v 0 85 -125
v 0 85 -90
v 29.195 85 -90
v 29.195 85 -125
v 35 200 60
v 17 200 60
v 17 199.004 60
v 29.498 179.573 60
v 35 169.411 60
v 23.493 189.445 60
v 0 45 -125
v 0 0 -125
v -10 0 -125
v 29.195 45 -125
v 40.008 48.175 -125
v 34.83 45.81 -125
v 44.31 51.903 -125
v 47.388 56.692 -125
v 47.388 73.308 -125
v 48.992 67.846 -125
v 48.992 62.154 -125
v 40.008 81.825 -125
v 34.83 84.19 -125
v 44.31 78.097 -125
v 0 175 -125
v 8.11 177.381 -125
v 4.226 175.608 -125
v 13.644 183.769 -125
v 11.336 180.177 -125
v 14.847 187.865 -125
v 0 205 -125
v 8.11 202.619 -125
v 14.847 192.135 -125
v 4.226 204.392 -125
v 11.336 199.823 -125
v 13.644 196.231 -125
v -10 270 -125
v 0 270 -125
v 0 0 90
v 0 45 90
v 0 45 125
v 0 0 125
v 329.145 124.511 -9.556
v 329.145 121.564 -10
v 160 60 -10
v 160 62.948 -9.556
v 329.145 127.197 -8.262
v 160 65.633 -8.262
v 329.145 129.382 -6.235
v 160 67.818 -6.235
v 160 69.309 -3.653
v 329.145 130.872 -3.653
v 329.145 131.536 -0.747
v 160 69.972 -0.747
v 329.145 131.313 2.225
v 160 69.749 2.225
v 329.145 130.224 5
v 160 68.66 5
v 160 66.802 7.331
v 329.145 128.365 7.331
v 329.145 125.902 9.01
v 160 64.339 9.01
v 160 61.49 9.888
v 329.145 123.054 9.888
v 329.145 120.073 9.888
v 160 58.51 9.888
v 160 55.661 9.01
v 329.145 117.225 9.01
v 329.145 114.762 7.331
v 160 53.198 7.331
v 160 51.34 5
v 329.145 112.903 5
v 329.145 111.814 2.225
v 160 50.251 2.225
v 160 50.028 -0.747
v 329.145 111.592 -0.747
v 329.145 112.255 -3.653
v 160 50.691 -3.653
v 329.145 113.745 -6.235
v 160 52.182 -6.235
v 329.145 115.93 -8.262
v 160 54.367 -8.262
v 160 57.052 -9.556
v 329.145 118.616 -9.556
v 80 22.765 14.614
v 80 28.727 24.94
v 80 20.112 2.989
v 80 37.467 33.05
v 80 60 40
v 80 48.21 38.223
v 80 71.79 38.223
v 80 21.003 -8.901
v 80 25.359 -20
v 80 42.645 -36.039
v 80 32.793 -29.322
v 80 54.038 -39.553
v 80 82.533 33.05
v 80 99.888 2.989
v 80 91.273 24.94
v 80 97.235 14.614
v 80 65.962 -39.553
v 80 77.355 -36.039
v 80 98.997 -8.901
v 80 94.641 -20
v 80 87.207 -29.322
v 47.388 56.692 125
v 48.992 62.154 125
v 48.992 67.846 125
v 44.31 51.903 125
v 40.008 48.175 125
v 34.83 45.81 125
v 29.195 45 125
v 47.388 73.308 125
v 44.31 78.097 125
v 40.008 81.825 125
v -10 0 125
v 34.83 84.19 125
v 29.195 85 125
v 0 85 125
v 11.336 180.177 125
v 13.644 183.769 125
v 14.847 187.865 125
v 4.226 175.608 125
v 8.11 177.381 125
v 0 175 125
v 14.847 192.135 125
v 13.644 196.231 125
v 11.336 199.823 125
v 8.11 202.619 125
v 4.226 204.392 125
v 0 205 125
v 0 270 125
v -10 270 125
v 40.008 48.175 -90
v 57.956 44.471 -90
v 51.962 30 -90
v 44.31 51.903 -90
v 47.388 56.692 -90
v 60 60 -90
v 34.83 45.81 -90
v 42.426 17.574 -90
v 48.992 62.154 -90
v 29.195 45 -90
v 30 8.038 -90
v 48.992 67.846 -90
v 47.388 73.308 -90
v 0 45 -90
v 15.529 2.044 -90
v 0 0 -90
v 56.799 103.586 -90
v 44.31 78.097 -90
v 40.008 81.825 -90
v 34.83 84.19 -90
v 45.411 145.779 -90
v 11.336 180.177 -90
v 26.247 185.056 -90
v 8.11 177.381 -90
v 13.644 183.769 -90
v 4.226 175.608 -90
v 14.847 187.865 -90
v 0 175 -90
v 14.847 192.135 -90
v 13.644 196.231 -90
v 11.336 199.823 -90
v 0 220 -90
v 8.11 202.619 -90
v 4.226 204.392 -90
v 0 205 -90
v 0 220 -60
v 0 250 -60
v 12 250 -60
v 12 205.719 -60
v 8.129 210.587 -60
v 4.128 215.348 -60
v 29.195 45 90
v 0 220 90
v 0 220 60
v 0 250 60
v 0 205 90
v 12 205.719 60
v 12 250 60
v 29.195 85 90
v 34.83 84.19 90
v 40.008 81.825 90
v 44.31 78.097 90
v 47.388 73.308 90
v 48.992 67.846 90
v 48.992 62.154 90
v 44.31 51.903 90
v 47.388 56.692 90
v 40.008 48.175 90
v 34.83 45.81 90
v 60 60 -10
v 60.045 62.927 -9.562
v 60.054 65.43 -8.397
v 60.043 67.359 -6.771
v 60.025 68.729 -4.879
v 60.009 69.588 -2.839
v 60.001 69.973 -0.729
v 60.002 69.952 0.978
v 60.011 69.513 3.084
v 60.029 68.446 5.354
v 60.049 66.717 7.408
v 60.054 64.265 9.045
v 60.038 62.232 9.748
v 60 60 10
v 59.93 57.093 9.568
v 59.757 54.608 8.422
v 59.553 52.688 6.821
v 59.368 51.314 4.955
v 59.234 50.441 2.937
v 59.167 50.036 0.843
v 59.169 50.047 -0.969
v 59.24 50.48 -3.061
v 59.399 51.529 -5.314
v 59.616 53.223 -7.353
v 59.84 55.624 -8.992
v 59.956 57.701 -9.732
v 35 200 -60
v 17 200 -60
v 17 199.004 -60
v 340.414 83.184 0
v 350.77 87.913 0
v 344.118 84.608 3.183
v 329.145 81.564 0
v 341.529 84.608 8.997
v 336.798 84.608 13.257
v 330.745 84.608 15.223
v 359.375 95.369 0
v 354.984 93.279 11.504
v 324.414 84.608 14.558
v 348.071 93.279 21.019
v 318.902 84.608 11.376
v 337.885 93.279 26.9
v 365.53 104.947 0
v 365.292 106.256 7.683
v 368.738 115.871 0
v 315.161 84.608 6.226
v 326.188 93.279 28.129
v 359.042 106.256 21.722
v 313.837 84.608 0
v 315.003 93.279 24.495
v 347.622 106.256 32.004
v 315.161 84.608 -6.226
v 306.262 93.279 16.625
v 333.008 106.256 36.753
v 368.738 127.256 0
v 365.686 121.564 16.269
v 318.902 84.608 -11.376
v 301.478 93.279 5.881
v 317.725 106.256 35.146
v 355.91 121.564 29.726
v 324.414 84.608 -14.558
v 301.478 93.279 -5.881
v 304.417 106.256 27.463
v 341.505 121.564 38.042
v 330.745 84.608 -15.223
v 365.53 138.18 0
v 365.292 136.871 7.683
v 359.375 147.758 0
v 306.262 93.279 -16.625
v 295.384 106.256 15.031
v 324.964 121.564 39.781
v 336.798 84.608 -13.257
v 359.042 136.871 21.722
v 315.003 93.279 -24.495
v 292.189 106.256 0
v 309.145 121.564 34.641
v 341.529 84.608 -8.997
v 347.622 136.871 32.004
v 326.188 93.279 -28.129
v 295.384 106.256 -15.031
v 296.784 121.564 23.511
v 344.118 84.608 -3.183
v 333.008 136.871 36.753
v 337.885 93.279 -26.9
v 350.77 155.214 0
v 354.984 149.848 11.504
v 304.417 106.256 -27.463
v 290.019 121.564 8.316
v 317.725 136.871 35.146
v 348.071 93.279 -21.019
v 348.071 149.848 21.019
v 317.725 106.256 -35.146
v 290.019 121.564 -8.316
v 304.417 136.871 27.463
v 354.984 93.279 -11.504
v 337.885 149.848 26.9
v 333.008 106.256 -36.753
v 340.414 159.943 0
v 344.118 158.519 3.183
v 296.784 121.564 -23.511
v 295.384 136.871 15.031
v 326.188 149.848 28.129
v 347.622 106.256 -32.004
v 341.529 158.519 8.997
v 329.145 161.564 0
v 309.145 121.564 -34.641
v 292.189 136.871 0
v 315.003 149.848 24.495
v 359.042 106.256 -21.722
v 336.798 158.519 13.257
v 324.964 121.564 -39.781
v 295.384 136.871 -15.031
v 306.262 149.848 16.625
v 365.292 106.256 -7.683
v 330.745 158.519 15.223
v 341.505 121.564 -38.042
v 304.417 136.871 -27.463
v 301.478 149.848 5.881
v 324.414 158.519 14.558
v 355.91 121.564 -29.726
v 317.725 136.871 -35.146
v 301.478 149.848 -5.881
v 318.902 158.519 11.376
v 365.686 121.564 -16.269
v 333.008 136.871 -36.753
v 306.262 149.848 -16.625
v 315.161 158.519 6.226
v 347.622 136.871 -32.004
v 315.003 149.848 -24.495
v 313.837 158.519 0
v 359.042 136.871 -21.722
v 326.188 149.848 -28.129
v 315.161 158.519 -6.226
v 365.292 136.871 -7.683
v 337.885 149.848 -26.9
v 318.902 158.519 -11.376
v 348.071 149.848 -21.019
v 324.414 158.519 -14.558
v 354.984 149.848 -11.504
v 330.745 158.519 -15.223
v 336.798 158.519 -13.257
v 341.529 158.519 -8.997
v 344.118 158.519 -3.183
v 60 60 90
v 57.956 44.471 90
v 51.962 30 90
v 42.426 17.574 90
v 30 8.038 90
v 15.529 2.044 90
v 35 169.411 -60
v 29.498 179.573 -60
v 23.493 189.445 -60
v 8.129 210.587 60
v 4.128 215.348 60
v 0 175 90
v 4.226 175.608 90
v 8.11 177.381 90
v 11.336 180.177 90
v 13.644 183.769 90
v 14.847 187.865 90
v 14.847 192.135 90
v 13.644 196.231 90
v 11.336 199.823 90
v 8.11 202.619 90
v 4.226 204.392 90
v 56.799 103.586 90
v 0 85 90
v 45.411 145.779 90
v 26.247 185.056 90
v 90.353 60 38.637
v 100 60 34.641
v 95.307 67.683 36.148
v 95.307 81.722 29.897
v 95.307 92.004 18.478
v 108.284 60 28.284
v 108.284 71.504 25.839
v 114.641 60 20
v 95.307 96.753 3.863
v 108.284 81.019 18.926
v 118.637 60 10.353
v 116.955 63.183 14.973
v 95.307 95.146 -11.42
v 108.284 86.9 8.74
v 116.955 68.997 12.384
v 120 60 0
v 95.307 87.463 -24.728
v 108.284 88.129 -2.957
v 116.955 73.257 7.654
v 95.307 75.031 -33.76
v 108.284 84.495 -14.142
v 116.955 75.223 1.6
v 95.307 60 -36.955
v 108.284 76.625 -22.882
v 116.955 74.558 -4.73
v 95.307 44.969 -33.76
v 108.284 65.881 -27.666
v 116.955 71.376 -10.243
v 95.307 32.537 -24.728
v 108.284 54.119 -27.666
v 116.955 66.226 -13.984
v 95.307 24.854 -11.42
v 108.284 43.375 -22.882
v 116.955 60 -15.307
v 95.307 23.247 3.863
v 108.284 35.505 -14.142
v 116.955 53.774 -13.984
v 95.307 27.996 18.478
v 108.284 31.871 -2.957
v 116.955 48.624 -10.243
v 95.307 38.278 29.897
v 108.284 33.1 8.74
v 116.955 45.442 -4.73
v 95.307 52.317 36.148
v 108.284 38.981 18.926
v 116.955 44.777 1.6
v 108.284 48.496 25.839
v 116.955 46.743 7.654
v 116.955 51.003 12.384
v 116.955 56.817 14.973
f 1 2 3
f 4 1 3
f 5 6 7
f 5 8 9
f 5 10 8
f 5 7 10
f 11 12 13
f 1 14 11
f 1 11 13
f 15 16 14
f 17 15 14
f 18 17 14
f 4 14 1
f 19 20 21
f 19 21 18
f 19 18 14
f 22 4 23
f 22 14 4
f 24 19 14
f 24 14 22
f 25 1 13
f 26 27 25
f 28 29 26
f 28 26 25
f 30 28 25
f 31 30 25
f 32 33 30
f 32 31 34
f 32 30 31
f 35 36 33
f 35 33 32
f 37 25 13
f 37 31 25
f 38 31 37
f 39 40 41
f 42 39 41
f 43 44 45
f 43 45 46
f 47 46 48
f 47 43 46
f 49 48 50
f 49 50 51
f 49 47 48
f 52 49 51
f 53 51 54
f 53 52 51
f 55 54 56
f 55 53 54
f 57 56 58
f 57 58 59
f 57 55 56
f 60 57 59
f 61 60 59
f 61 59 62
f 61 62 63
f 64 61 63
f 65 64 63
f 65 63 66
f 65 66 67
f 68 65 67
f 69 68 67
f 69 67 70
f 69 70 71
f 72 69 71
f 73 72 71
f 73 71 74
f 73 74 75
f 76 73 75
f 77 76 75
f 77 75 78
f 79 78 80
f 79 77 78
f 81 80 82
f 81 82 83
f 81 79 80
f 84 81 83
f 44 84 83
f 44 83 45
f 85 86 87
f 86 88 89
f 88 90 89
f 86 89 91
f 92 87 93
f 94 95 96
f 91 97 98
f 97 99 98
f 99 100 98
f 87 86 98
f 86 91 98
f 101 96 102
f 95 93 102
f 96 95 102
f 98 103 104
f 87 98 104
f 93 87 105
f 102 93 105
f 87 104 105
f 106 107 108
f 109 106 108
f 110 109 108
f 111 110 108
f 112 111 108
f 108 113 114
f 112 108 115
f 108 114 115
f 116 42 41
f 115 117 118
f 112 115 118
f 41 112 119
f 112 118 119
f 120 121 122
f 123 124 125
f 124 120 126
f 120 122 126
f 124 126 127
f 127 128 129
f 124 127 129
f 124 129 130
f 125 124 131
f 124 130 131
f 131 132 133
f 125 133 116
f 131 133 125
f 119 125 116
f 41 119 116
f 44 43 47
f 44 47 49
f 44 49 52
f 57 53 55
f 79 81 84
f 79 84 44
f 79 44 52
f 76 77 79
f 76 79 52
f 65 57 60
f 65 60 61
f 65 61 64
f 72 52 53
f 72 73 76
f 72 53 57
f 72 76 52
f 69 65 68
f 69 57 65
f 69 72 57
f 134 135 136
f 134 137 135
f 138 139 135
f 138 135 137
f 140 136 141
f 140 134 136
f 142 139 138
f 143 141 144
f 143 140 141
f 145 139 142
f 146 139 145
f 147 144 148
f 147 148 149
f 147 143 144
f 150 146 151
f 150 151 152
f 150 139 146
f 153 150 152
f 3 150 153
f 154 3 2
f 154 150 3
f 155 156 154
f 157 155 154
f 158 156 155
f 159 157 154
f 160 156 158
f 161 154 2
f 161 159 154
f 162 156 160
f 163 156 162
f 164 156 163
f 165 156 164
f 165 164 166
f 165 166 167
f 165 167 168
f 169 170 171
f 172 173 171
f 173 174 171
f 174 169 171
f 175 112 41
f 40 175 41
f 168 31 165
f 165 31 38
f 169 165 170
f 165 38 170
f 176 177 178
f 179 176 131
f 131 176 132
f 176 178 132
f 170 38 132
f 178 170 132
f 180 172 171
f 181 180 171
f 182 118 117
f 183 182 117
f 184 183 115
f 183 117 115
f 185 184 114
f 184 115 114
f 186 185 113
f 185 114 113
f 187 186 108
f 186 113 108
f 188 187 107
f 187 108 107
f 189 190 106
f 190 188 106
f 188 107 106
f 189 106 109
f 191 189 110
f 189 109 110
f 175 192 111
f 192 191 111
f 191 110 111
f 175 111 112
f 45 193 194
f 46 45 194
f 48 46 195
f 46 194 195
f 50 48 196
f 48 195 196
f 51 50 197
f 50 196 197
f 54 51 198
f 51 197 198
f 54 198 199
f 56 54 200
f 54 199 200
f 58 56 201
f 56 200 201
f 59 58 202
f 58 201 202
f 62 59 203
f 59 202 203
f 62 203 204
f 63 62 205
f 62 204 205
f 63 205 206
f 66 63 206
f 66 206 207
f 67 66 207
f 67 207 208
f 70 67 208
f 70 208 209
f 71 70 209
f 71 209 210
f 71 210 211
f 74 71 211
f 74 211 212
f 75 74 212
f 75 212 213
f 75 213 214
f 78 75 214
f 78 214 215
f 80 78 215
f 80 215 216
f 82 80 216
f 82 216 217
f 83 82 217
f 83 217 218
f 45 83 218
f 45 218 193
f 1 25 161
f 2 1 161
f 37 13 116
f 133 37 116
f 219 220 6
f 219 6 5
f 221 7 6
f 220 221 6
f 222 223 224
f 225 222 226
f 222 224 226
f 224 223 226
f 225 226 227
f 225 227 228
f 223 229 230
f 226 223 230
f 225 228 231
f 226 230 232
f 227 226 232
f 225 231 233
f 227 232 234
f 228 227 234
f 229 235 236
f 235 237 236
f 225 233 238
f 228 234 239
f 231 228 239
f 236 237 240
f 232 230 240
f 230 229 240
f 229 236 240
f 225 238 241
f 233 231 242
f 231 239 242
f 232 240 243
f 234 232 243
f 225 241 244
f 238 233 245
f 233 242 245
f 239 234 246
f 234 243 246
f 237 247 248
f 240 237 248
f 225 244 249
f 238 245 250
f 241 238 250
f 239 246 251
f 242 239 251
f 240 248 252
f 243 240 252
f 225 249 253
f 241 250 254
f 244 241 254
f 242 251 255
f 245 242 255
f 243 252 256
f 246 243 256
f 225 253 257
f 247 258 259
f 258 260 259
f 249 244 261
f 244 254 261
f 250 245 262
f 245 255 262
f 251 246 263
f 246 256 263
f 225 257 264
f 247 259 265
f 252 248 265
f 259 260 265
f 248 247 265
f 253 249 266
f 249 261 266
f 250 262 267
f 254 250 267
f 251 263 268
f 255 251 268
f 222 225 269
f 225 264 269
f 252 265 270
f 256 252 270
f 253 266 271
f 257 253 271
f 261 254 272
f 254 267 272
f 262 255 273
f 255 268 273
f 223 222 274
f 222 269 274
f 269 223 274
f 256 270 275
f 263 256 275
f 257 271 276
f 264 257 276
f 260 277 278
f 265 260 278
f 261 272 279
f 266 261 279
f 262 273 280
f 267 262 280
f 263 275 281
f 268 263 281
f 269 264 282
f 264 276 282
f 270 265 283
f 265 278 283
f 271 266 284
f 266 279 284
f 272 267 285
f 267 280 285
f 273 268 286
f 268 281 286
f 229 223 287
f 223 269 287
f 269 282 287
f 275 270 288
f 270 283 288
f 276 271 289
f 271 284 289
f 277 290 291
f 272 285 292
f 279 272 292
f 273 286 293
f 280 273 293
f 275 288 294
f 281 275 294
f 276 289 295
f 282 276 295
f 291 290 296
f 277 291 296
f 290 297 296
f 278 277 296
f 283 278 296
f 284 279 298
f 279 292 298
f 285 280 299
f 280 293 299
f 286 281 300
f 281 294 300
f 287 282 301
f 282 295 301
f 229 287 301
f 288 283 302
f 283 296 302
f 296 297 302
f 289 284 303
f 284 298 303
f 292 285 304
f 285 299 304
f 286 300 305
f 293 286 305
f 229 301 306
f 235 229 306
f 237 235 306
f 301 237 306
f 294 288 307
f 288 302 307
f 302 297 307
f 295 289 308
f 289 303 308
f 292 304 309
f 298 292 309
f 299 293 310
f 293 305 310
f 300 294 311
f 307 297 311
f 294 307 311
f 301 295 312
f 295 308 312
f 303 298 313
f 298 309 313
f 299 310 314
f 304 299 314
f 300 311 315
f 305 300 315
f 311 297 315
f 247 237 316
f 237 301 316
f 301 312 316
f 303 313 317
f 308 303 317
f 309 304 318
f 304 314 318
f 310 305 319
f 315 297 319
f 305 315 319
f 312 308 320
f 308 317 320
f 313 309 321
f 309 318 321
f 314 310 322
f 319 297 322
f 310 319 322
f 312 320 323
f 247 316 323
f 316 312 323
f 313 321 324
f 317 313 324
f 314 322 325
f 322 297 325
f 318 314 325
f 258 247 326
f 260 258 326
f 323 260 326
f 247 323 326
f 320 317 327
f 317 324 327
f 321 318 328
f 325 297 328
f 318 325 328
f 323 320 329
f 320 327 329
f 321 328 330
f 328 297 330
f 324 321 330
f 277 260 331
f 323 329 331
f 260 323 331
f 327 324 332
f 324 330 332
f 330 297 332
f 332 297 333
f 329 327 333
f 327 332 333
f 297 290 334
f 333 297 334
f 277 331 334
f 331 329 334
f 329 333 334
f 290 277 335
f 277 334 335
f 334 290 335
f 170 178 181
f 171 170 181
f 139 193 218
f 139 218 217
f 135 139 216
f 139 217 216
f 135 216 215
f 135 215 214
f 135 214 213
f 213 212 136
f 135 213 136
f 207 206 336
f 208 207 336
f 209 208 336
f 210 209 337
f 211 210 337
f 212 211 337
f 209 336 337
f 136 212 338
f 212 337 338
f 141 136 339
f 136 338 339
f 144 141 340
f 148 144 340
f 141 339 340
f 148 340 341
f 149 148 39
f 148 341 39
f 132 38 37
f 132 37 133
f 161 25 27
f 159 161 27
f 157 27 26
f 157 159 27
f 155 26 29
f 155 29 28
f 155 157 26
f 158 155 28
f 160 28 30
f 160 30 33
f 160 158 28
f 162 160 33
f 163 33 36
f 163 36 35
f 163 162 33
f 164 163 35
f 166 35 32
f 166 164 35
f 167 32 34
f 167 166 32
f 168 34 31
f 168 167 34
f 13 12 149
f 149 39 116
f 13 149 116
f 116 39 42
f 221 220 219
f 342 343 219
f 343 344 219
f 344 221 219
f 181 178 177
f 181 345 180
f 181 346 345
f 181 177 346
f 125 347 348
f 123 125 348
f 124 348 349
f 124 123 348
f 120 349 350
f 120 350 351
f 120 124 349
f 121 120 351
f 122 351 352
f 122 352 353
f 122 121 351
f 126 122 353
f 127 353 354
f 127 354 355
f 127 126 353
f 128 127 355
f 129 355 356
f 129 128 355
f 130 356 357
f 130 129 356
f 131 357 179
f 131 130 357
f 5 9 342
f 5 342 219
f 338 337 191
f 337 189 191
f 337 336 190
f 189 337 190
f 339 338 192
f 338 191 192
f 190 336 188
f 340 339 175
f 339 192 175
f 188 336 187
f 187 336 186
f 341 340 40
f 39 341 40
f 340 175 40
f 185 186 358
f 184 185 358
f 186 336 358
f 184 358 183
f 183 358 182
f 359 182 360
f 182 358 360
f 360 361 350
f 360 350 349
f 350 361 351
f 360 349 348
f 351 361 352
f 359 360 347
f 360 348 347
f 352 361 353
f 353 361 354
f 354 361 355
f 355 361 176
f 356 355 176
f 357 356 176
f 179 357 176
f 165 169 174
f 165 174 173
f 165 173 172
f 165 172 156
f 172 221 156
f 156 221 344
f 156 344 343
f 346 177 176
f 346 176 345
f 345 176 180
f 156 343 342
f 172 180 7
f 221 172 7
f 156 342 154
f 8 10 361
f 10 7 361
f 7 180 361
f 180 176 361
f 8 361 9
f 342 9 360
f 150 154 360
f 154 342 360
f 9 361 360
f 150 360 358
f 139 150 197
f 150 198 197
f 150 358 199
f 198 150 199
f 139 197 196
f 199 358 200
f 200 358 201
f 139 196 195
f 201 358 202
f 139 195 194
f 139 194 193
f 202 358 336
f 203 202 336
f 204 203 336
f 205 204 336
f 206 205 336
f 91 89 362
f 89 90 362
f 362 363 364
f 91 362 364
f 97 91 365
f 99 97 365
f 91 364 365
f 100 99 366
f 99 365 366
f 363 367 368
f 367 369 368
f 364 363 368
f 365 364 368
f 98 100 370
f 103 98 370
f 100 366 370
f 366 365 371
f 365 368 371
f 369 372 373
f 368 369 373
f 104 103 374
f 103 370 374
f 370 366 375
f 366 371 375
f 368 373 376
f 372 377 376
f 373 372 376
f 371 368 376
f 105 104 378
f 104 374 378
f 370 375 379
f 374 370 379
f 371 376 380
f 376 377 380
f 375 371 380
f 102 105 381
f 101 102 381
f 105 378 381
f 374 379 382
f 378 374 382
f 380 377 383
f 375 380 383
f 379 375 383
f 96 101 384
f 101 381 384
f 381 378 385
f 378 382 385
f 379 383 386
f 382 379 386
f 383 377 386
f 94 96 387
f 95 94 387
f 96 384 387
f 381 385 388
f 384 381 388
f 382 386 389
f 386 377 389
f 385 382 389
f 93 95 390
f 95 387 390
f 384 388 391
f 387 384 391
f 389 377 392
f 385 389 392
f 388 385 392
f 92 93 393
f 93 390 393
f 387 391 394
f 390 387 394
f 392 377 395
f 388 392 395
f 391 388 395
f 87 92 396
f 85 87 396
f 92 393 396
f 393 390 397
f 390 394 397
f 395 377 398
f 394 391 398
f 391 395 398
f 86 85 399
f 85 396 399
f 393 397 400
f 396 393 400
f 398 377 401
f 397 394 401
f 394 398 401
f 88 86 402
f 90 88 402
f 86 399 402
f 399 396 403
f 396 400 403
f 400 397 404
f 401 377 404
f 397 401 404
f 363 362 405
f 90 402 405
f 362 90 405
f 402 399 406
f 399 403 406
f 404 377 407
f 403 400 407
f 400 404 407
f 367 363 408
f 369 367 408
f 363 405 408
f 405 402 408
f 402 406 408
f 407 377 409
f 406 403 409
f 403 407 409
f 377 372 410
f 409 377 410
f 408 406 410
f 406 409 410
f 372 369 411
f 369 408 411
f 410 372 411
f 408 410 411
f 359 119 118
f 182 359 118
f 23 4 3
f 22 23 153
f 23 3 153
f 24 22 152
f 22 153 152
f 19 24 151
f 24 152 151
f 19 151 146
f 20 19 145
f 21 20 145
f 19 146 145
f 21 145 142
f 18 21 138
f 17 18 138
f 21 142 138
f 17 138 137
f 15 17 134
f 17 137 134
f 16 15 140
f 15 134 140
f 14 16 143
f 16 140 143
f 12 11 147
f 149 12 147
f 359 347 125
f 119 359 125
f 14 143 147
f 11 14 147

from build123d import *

# Parameters (mm, degrees)
BOSS_EXTRUDE1_DEPTH = 90
SKETCH2_W           = 250
SKETCH2_H           = 270
BOSS_EXTRUDE2_DEPTH = 10
SKETCH4_W           = 12
SKETCH4_H           = 72.929709738
SKETCH4_W_2         = 18
SKETCH4_H_2         = 62.633795367
BOSS_EXTRUDE3_DEPTH = 60
BOSS_EXTRUDE4_DEPTH = 250
SKETCH6_R           = 10
BOSS_EXTRUDE5_DEPTH = 160
SKETCH9_R           = 10


with BuildPart() as part:
    # Sketch1 → Boss-Extrude1 (new body, symmetric)
    with BuildSketch(Plane.XY):
        with BuildLine():
            Line((0, 0), (0, 220))
            ThreePointArc((0, 220), (45.41051287, 145.778942326), (60, 60))
            ThreePointArc((60, 60), (42.426406871, 17.573593129), (0, 0))
        make_face()
    extrude(amount=BOSS_EXTRUDE1_DEPTH, both=True)

    # Sketch2 → Boss-Extrude2 (add)
    with BuildSketch(Plane.ZY):
        with Locations((0, 135)):
            Rectangle(SKETCH2_W, SKETCH2_H)
    extrude(amount=BOSS_EXTRUDE2_DEPTH)

    # Sketch4 → Boss-Extrude3 (add, symmetric)
    with BuildSketch(Plane.XY):
        with Locations((6, 213.535145131)):
            Rectangle(SKETCH4_W, SKETCH4_H)
        with Locations((26, 168.683102316)):
            Rectangle(SKETCH4_W_2, SKETCH4_H_2)
    extrude(amount=BOSS_EXTRUDE3_DEPTH, both=True)

    # Sketch5 → Boss-Extrude4 (add)
    with BuildSketch(Plane.XY.offset(125)):
        with BuildLine():
            Line((0, 85), (29.195094319, 85))
            ThreePointArc((29.195094319, 85), (49.195094319, 65), (29.195094319, 45))
            Line((29.195094319, 45), (0, 45))
            Line((0, 45), (0, 85))
        make_face()
        with BuildLine():
            Line((0, 205), (0, 175))
            ThreePointArc((0, 175), (15, 190), (0, 205))
        make_face()
    extrude(amount=-BOSS_EXTRUDE4_DEPTH)

    # Sketch6 → Boss-Extrude5 (add)
    with BuildSketch(Plane(origin=(0, 0, 0), x_dir=(0, 0, -1), z_dir=(1, 0, 0))):
        with Locations((0, 60)):
            Circle(SKETCH6_R)
    extrude(amount=BOSS_EXTRUDE5_DEPTH)

    # Sweep1: sweep along a path in Sketch8
    with BuildLine(Plane.XY) as sweep1_path:
        Line((160, 60), (329.144671741, 121.563625799))
    # Sketch9 → Sweep1 (sweep)
    with BuildSketch(Plane(origin=(160, 0, 0), x_dir=(0, 0, -1), z_dir=(1, 0, 0))):
        with Locations((0, 60)):
            Circle(SKETCH9_R)
    sweep(path=sweep1_path.line)


with BuildPart() as body_2:
    # Sketch7 → Revolve1 (revolve)
    with BuildSketch(Plane(origin=(0, 60, 0), x_dir=(-1, 0, 0), z_dir=(0, -1, 0))):
        with BuildLine():
            Line((-80, 0), (-80, -40))
            ThreePointArc((-80, -40), (-108.284271247, -28.284271247), (-120, 0))
            Line((-120, 0), (-80, 0))
        make_face()
    revolve(axis=Axis((120, 60, 0), (-1, 0, 0)))


with BuildPart() as body_3:
    # Sketch10 → Revolve2 (revolve)
    with BuildSketch(Plane.XY):
        with BuildLine():
            Line((329.144671741, 161.563625799), (329.144671741, 81.563625799))
            ThreePointArc((329.144671741, 81.563625799), (369.144671741, 121.563625799), (329.144671741, 161.563625799))
        make_face()
    revolve(axis=Axis((329.144671741, 161.563625799, 0), (0, -1, 0)))


solid = Compound([part.part, body_2.part, body_3.part])
